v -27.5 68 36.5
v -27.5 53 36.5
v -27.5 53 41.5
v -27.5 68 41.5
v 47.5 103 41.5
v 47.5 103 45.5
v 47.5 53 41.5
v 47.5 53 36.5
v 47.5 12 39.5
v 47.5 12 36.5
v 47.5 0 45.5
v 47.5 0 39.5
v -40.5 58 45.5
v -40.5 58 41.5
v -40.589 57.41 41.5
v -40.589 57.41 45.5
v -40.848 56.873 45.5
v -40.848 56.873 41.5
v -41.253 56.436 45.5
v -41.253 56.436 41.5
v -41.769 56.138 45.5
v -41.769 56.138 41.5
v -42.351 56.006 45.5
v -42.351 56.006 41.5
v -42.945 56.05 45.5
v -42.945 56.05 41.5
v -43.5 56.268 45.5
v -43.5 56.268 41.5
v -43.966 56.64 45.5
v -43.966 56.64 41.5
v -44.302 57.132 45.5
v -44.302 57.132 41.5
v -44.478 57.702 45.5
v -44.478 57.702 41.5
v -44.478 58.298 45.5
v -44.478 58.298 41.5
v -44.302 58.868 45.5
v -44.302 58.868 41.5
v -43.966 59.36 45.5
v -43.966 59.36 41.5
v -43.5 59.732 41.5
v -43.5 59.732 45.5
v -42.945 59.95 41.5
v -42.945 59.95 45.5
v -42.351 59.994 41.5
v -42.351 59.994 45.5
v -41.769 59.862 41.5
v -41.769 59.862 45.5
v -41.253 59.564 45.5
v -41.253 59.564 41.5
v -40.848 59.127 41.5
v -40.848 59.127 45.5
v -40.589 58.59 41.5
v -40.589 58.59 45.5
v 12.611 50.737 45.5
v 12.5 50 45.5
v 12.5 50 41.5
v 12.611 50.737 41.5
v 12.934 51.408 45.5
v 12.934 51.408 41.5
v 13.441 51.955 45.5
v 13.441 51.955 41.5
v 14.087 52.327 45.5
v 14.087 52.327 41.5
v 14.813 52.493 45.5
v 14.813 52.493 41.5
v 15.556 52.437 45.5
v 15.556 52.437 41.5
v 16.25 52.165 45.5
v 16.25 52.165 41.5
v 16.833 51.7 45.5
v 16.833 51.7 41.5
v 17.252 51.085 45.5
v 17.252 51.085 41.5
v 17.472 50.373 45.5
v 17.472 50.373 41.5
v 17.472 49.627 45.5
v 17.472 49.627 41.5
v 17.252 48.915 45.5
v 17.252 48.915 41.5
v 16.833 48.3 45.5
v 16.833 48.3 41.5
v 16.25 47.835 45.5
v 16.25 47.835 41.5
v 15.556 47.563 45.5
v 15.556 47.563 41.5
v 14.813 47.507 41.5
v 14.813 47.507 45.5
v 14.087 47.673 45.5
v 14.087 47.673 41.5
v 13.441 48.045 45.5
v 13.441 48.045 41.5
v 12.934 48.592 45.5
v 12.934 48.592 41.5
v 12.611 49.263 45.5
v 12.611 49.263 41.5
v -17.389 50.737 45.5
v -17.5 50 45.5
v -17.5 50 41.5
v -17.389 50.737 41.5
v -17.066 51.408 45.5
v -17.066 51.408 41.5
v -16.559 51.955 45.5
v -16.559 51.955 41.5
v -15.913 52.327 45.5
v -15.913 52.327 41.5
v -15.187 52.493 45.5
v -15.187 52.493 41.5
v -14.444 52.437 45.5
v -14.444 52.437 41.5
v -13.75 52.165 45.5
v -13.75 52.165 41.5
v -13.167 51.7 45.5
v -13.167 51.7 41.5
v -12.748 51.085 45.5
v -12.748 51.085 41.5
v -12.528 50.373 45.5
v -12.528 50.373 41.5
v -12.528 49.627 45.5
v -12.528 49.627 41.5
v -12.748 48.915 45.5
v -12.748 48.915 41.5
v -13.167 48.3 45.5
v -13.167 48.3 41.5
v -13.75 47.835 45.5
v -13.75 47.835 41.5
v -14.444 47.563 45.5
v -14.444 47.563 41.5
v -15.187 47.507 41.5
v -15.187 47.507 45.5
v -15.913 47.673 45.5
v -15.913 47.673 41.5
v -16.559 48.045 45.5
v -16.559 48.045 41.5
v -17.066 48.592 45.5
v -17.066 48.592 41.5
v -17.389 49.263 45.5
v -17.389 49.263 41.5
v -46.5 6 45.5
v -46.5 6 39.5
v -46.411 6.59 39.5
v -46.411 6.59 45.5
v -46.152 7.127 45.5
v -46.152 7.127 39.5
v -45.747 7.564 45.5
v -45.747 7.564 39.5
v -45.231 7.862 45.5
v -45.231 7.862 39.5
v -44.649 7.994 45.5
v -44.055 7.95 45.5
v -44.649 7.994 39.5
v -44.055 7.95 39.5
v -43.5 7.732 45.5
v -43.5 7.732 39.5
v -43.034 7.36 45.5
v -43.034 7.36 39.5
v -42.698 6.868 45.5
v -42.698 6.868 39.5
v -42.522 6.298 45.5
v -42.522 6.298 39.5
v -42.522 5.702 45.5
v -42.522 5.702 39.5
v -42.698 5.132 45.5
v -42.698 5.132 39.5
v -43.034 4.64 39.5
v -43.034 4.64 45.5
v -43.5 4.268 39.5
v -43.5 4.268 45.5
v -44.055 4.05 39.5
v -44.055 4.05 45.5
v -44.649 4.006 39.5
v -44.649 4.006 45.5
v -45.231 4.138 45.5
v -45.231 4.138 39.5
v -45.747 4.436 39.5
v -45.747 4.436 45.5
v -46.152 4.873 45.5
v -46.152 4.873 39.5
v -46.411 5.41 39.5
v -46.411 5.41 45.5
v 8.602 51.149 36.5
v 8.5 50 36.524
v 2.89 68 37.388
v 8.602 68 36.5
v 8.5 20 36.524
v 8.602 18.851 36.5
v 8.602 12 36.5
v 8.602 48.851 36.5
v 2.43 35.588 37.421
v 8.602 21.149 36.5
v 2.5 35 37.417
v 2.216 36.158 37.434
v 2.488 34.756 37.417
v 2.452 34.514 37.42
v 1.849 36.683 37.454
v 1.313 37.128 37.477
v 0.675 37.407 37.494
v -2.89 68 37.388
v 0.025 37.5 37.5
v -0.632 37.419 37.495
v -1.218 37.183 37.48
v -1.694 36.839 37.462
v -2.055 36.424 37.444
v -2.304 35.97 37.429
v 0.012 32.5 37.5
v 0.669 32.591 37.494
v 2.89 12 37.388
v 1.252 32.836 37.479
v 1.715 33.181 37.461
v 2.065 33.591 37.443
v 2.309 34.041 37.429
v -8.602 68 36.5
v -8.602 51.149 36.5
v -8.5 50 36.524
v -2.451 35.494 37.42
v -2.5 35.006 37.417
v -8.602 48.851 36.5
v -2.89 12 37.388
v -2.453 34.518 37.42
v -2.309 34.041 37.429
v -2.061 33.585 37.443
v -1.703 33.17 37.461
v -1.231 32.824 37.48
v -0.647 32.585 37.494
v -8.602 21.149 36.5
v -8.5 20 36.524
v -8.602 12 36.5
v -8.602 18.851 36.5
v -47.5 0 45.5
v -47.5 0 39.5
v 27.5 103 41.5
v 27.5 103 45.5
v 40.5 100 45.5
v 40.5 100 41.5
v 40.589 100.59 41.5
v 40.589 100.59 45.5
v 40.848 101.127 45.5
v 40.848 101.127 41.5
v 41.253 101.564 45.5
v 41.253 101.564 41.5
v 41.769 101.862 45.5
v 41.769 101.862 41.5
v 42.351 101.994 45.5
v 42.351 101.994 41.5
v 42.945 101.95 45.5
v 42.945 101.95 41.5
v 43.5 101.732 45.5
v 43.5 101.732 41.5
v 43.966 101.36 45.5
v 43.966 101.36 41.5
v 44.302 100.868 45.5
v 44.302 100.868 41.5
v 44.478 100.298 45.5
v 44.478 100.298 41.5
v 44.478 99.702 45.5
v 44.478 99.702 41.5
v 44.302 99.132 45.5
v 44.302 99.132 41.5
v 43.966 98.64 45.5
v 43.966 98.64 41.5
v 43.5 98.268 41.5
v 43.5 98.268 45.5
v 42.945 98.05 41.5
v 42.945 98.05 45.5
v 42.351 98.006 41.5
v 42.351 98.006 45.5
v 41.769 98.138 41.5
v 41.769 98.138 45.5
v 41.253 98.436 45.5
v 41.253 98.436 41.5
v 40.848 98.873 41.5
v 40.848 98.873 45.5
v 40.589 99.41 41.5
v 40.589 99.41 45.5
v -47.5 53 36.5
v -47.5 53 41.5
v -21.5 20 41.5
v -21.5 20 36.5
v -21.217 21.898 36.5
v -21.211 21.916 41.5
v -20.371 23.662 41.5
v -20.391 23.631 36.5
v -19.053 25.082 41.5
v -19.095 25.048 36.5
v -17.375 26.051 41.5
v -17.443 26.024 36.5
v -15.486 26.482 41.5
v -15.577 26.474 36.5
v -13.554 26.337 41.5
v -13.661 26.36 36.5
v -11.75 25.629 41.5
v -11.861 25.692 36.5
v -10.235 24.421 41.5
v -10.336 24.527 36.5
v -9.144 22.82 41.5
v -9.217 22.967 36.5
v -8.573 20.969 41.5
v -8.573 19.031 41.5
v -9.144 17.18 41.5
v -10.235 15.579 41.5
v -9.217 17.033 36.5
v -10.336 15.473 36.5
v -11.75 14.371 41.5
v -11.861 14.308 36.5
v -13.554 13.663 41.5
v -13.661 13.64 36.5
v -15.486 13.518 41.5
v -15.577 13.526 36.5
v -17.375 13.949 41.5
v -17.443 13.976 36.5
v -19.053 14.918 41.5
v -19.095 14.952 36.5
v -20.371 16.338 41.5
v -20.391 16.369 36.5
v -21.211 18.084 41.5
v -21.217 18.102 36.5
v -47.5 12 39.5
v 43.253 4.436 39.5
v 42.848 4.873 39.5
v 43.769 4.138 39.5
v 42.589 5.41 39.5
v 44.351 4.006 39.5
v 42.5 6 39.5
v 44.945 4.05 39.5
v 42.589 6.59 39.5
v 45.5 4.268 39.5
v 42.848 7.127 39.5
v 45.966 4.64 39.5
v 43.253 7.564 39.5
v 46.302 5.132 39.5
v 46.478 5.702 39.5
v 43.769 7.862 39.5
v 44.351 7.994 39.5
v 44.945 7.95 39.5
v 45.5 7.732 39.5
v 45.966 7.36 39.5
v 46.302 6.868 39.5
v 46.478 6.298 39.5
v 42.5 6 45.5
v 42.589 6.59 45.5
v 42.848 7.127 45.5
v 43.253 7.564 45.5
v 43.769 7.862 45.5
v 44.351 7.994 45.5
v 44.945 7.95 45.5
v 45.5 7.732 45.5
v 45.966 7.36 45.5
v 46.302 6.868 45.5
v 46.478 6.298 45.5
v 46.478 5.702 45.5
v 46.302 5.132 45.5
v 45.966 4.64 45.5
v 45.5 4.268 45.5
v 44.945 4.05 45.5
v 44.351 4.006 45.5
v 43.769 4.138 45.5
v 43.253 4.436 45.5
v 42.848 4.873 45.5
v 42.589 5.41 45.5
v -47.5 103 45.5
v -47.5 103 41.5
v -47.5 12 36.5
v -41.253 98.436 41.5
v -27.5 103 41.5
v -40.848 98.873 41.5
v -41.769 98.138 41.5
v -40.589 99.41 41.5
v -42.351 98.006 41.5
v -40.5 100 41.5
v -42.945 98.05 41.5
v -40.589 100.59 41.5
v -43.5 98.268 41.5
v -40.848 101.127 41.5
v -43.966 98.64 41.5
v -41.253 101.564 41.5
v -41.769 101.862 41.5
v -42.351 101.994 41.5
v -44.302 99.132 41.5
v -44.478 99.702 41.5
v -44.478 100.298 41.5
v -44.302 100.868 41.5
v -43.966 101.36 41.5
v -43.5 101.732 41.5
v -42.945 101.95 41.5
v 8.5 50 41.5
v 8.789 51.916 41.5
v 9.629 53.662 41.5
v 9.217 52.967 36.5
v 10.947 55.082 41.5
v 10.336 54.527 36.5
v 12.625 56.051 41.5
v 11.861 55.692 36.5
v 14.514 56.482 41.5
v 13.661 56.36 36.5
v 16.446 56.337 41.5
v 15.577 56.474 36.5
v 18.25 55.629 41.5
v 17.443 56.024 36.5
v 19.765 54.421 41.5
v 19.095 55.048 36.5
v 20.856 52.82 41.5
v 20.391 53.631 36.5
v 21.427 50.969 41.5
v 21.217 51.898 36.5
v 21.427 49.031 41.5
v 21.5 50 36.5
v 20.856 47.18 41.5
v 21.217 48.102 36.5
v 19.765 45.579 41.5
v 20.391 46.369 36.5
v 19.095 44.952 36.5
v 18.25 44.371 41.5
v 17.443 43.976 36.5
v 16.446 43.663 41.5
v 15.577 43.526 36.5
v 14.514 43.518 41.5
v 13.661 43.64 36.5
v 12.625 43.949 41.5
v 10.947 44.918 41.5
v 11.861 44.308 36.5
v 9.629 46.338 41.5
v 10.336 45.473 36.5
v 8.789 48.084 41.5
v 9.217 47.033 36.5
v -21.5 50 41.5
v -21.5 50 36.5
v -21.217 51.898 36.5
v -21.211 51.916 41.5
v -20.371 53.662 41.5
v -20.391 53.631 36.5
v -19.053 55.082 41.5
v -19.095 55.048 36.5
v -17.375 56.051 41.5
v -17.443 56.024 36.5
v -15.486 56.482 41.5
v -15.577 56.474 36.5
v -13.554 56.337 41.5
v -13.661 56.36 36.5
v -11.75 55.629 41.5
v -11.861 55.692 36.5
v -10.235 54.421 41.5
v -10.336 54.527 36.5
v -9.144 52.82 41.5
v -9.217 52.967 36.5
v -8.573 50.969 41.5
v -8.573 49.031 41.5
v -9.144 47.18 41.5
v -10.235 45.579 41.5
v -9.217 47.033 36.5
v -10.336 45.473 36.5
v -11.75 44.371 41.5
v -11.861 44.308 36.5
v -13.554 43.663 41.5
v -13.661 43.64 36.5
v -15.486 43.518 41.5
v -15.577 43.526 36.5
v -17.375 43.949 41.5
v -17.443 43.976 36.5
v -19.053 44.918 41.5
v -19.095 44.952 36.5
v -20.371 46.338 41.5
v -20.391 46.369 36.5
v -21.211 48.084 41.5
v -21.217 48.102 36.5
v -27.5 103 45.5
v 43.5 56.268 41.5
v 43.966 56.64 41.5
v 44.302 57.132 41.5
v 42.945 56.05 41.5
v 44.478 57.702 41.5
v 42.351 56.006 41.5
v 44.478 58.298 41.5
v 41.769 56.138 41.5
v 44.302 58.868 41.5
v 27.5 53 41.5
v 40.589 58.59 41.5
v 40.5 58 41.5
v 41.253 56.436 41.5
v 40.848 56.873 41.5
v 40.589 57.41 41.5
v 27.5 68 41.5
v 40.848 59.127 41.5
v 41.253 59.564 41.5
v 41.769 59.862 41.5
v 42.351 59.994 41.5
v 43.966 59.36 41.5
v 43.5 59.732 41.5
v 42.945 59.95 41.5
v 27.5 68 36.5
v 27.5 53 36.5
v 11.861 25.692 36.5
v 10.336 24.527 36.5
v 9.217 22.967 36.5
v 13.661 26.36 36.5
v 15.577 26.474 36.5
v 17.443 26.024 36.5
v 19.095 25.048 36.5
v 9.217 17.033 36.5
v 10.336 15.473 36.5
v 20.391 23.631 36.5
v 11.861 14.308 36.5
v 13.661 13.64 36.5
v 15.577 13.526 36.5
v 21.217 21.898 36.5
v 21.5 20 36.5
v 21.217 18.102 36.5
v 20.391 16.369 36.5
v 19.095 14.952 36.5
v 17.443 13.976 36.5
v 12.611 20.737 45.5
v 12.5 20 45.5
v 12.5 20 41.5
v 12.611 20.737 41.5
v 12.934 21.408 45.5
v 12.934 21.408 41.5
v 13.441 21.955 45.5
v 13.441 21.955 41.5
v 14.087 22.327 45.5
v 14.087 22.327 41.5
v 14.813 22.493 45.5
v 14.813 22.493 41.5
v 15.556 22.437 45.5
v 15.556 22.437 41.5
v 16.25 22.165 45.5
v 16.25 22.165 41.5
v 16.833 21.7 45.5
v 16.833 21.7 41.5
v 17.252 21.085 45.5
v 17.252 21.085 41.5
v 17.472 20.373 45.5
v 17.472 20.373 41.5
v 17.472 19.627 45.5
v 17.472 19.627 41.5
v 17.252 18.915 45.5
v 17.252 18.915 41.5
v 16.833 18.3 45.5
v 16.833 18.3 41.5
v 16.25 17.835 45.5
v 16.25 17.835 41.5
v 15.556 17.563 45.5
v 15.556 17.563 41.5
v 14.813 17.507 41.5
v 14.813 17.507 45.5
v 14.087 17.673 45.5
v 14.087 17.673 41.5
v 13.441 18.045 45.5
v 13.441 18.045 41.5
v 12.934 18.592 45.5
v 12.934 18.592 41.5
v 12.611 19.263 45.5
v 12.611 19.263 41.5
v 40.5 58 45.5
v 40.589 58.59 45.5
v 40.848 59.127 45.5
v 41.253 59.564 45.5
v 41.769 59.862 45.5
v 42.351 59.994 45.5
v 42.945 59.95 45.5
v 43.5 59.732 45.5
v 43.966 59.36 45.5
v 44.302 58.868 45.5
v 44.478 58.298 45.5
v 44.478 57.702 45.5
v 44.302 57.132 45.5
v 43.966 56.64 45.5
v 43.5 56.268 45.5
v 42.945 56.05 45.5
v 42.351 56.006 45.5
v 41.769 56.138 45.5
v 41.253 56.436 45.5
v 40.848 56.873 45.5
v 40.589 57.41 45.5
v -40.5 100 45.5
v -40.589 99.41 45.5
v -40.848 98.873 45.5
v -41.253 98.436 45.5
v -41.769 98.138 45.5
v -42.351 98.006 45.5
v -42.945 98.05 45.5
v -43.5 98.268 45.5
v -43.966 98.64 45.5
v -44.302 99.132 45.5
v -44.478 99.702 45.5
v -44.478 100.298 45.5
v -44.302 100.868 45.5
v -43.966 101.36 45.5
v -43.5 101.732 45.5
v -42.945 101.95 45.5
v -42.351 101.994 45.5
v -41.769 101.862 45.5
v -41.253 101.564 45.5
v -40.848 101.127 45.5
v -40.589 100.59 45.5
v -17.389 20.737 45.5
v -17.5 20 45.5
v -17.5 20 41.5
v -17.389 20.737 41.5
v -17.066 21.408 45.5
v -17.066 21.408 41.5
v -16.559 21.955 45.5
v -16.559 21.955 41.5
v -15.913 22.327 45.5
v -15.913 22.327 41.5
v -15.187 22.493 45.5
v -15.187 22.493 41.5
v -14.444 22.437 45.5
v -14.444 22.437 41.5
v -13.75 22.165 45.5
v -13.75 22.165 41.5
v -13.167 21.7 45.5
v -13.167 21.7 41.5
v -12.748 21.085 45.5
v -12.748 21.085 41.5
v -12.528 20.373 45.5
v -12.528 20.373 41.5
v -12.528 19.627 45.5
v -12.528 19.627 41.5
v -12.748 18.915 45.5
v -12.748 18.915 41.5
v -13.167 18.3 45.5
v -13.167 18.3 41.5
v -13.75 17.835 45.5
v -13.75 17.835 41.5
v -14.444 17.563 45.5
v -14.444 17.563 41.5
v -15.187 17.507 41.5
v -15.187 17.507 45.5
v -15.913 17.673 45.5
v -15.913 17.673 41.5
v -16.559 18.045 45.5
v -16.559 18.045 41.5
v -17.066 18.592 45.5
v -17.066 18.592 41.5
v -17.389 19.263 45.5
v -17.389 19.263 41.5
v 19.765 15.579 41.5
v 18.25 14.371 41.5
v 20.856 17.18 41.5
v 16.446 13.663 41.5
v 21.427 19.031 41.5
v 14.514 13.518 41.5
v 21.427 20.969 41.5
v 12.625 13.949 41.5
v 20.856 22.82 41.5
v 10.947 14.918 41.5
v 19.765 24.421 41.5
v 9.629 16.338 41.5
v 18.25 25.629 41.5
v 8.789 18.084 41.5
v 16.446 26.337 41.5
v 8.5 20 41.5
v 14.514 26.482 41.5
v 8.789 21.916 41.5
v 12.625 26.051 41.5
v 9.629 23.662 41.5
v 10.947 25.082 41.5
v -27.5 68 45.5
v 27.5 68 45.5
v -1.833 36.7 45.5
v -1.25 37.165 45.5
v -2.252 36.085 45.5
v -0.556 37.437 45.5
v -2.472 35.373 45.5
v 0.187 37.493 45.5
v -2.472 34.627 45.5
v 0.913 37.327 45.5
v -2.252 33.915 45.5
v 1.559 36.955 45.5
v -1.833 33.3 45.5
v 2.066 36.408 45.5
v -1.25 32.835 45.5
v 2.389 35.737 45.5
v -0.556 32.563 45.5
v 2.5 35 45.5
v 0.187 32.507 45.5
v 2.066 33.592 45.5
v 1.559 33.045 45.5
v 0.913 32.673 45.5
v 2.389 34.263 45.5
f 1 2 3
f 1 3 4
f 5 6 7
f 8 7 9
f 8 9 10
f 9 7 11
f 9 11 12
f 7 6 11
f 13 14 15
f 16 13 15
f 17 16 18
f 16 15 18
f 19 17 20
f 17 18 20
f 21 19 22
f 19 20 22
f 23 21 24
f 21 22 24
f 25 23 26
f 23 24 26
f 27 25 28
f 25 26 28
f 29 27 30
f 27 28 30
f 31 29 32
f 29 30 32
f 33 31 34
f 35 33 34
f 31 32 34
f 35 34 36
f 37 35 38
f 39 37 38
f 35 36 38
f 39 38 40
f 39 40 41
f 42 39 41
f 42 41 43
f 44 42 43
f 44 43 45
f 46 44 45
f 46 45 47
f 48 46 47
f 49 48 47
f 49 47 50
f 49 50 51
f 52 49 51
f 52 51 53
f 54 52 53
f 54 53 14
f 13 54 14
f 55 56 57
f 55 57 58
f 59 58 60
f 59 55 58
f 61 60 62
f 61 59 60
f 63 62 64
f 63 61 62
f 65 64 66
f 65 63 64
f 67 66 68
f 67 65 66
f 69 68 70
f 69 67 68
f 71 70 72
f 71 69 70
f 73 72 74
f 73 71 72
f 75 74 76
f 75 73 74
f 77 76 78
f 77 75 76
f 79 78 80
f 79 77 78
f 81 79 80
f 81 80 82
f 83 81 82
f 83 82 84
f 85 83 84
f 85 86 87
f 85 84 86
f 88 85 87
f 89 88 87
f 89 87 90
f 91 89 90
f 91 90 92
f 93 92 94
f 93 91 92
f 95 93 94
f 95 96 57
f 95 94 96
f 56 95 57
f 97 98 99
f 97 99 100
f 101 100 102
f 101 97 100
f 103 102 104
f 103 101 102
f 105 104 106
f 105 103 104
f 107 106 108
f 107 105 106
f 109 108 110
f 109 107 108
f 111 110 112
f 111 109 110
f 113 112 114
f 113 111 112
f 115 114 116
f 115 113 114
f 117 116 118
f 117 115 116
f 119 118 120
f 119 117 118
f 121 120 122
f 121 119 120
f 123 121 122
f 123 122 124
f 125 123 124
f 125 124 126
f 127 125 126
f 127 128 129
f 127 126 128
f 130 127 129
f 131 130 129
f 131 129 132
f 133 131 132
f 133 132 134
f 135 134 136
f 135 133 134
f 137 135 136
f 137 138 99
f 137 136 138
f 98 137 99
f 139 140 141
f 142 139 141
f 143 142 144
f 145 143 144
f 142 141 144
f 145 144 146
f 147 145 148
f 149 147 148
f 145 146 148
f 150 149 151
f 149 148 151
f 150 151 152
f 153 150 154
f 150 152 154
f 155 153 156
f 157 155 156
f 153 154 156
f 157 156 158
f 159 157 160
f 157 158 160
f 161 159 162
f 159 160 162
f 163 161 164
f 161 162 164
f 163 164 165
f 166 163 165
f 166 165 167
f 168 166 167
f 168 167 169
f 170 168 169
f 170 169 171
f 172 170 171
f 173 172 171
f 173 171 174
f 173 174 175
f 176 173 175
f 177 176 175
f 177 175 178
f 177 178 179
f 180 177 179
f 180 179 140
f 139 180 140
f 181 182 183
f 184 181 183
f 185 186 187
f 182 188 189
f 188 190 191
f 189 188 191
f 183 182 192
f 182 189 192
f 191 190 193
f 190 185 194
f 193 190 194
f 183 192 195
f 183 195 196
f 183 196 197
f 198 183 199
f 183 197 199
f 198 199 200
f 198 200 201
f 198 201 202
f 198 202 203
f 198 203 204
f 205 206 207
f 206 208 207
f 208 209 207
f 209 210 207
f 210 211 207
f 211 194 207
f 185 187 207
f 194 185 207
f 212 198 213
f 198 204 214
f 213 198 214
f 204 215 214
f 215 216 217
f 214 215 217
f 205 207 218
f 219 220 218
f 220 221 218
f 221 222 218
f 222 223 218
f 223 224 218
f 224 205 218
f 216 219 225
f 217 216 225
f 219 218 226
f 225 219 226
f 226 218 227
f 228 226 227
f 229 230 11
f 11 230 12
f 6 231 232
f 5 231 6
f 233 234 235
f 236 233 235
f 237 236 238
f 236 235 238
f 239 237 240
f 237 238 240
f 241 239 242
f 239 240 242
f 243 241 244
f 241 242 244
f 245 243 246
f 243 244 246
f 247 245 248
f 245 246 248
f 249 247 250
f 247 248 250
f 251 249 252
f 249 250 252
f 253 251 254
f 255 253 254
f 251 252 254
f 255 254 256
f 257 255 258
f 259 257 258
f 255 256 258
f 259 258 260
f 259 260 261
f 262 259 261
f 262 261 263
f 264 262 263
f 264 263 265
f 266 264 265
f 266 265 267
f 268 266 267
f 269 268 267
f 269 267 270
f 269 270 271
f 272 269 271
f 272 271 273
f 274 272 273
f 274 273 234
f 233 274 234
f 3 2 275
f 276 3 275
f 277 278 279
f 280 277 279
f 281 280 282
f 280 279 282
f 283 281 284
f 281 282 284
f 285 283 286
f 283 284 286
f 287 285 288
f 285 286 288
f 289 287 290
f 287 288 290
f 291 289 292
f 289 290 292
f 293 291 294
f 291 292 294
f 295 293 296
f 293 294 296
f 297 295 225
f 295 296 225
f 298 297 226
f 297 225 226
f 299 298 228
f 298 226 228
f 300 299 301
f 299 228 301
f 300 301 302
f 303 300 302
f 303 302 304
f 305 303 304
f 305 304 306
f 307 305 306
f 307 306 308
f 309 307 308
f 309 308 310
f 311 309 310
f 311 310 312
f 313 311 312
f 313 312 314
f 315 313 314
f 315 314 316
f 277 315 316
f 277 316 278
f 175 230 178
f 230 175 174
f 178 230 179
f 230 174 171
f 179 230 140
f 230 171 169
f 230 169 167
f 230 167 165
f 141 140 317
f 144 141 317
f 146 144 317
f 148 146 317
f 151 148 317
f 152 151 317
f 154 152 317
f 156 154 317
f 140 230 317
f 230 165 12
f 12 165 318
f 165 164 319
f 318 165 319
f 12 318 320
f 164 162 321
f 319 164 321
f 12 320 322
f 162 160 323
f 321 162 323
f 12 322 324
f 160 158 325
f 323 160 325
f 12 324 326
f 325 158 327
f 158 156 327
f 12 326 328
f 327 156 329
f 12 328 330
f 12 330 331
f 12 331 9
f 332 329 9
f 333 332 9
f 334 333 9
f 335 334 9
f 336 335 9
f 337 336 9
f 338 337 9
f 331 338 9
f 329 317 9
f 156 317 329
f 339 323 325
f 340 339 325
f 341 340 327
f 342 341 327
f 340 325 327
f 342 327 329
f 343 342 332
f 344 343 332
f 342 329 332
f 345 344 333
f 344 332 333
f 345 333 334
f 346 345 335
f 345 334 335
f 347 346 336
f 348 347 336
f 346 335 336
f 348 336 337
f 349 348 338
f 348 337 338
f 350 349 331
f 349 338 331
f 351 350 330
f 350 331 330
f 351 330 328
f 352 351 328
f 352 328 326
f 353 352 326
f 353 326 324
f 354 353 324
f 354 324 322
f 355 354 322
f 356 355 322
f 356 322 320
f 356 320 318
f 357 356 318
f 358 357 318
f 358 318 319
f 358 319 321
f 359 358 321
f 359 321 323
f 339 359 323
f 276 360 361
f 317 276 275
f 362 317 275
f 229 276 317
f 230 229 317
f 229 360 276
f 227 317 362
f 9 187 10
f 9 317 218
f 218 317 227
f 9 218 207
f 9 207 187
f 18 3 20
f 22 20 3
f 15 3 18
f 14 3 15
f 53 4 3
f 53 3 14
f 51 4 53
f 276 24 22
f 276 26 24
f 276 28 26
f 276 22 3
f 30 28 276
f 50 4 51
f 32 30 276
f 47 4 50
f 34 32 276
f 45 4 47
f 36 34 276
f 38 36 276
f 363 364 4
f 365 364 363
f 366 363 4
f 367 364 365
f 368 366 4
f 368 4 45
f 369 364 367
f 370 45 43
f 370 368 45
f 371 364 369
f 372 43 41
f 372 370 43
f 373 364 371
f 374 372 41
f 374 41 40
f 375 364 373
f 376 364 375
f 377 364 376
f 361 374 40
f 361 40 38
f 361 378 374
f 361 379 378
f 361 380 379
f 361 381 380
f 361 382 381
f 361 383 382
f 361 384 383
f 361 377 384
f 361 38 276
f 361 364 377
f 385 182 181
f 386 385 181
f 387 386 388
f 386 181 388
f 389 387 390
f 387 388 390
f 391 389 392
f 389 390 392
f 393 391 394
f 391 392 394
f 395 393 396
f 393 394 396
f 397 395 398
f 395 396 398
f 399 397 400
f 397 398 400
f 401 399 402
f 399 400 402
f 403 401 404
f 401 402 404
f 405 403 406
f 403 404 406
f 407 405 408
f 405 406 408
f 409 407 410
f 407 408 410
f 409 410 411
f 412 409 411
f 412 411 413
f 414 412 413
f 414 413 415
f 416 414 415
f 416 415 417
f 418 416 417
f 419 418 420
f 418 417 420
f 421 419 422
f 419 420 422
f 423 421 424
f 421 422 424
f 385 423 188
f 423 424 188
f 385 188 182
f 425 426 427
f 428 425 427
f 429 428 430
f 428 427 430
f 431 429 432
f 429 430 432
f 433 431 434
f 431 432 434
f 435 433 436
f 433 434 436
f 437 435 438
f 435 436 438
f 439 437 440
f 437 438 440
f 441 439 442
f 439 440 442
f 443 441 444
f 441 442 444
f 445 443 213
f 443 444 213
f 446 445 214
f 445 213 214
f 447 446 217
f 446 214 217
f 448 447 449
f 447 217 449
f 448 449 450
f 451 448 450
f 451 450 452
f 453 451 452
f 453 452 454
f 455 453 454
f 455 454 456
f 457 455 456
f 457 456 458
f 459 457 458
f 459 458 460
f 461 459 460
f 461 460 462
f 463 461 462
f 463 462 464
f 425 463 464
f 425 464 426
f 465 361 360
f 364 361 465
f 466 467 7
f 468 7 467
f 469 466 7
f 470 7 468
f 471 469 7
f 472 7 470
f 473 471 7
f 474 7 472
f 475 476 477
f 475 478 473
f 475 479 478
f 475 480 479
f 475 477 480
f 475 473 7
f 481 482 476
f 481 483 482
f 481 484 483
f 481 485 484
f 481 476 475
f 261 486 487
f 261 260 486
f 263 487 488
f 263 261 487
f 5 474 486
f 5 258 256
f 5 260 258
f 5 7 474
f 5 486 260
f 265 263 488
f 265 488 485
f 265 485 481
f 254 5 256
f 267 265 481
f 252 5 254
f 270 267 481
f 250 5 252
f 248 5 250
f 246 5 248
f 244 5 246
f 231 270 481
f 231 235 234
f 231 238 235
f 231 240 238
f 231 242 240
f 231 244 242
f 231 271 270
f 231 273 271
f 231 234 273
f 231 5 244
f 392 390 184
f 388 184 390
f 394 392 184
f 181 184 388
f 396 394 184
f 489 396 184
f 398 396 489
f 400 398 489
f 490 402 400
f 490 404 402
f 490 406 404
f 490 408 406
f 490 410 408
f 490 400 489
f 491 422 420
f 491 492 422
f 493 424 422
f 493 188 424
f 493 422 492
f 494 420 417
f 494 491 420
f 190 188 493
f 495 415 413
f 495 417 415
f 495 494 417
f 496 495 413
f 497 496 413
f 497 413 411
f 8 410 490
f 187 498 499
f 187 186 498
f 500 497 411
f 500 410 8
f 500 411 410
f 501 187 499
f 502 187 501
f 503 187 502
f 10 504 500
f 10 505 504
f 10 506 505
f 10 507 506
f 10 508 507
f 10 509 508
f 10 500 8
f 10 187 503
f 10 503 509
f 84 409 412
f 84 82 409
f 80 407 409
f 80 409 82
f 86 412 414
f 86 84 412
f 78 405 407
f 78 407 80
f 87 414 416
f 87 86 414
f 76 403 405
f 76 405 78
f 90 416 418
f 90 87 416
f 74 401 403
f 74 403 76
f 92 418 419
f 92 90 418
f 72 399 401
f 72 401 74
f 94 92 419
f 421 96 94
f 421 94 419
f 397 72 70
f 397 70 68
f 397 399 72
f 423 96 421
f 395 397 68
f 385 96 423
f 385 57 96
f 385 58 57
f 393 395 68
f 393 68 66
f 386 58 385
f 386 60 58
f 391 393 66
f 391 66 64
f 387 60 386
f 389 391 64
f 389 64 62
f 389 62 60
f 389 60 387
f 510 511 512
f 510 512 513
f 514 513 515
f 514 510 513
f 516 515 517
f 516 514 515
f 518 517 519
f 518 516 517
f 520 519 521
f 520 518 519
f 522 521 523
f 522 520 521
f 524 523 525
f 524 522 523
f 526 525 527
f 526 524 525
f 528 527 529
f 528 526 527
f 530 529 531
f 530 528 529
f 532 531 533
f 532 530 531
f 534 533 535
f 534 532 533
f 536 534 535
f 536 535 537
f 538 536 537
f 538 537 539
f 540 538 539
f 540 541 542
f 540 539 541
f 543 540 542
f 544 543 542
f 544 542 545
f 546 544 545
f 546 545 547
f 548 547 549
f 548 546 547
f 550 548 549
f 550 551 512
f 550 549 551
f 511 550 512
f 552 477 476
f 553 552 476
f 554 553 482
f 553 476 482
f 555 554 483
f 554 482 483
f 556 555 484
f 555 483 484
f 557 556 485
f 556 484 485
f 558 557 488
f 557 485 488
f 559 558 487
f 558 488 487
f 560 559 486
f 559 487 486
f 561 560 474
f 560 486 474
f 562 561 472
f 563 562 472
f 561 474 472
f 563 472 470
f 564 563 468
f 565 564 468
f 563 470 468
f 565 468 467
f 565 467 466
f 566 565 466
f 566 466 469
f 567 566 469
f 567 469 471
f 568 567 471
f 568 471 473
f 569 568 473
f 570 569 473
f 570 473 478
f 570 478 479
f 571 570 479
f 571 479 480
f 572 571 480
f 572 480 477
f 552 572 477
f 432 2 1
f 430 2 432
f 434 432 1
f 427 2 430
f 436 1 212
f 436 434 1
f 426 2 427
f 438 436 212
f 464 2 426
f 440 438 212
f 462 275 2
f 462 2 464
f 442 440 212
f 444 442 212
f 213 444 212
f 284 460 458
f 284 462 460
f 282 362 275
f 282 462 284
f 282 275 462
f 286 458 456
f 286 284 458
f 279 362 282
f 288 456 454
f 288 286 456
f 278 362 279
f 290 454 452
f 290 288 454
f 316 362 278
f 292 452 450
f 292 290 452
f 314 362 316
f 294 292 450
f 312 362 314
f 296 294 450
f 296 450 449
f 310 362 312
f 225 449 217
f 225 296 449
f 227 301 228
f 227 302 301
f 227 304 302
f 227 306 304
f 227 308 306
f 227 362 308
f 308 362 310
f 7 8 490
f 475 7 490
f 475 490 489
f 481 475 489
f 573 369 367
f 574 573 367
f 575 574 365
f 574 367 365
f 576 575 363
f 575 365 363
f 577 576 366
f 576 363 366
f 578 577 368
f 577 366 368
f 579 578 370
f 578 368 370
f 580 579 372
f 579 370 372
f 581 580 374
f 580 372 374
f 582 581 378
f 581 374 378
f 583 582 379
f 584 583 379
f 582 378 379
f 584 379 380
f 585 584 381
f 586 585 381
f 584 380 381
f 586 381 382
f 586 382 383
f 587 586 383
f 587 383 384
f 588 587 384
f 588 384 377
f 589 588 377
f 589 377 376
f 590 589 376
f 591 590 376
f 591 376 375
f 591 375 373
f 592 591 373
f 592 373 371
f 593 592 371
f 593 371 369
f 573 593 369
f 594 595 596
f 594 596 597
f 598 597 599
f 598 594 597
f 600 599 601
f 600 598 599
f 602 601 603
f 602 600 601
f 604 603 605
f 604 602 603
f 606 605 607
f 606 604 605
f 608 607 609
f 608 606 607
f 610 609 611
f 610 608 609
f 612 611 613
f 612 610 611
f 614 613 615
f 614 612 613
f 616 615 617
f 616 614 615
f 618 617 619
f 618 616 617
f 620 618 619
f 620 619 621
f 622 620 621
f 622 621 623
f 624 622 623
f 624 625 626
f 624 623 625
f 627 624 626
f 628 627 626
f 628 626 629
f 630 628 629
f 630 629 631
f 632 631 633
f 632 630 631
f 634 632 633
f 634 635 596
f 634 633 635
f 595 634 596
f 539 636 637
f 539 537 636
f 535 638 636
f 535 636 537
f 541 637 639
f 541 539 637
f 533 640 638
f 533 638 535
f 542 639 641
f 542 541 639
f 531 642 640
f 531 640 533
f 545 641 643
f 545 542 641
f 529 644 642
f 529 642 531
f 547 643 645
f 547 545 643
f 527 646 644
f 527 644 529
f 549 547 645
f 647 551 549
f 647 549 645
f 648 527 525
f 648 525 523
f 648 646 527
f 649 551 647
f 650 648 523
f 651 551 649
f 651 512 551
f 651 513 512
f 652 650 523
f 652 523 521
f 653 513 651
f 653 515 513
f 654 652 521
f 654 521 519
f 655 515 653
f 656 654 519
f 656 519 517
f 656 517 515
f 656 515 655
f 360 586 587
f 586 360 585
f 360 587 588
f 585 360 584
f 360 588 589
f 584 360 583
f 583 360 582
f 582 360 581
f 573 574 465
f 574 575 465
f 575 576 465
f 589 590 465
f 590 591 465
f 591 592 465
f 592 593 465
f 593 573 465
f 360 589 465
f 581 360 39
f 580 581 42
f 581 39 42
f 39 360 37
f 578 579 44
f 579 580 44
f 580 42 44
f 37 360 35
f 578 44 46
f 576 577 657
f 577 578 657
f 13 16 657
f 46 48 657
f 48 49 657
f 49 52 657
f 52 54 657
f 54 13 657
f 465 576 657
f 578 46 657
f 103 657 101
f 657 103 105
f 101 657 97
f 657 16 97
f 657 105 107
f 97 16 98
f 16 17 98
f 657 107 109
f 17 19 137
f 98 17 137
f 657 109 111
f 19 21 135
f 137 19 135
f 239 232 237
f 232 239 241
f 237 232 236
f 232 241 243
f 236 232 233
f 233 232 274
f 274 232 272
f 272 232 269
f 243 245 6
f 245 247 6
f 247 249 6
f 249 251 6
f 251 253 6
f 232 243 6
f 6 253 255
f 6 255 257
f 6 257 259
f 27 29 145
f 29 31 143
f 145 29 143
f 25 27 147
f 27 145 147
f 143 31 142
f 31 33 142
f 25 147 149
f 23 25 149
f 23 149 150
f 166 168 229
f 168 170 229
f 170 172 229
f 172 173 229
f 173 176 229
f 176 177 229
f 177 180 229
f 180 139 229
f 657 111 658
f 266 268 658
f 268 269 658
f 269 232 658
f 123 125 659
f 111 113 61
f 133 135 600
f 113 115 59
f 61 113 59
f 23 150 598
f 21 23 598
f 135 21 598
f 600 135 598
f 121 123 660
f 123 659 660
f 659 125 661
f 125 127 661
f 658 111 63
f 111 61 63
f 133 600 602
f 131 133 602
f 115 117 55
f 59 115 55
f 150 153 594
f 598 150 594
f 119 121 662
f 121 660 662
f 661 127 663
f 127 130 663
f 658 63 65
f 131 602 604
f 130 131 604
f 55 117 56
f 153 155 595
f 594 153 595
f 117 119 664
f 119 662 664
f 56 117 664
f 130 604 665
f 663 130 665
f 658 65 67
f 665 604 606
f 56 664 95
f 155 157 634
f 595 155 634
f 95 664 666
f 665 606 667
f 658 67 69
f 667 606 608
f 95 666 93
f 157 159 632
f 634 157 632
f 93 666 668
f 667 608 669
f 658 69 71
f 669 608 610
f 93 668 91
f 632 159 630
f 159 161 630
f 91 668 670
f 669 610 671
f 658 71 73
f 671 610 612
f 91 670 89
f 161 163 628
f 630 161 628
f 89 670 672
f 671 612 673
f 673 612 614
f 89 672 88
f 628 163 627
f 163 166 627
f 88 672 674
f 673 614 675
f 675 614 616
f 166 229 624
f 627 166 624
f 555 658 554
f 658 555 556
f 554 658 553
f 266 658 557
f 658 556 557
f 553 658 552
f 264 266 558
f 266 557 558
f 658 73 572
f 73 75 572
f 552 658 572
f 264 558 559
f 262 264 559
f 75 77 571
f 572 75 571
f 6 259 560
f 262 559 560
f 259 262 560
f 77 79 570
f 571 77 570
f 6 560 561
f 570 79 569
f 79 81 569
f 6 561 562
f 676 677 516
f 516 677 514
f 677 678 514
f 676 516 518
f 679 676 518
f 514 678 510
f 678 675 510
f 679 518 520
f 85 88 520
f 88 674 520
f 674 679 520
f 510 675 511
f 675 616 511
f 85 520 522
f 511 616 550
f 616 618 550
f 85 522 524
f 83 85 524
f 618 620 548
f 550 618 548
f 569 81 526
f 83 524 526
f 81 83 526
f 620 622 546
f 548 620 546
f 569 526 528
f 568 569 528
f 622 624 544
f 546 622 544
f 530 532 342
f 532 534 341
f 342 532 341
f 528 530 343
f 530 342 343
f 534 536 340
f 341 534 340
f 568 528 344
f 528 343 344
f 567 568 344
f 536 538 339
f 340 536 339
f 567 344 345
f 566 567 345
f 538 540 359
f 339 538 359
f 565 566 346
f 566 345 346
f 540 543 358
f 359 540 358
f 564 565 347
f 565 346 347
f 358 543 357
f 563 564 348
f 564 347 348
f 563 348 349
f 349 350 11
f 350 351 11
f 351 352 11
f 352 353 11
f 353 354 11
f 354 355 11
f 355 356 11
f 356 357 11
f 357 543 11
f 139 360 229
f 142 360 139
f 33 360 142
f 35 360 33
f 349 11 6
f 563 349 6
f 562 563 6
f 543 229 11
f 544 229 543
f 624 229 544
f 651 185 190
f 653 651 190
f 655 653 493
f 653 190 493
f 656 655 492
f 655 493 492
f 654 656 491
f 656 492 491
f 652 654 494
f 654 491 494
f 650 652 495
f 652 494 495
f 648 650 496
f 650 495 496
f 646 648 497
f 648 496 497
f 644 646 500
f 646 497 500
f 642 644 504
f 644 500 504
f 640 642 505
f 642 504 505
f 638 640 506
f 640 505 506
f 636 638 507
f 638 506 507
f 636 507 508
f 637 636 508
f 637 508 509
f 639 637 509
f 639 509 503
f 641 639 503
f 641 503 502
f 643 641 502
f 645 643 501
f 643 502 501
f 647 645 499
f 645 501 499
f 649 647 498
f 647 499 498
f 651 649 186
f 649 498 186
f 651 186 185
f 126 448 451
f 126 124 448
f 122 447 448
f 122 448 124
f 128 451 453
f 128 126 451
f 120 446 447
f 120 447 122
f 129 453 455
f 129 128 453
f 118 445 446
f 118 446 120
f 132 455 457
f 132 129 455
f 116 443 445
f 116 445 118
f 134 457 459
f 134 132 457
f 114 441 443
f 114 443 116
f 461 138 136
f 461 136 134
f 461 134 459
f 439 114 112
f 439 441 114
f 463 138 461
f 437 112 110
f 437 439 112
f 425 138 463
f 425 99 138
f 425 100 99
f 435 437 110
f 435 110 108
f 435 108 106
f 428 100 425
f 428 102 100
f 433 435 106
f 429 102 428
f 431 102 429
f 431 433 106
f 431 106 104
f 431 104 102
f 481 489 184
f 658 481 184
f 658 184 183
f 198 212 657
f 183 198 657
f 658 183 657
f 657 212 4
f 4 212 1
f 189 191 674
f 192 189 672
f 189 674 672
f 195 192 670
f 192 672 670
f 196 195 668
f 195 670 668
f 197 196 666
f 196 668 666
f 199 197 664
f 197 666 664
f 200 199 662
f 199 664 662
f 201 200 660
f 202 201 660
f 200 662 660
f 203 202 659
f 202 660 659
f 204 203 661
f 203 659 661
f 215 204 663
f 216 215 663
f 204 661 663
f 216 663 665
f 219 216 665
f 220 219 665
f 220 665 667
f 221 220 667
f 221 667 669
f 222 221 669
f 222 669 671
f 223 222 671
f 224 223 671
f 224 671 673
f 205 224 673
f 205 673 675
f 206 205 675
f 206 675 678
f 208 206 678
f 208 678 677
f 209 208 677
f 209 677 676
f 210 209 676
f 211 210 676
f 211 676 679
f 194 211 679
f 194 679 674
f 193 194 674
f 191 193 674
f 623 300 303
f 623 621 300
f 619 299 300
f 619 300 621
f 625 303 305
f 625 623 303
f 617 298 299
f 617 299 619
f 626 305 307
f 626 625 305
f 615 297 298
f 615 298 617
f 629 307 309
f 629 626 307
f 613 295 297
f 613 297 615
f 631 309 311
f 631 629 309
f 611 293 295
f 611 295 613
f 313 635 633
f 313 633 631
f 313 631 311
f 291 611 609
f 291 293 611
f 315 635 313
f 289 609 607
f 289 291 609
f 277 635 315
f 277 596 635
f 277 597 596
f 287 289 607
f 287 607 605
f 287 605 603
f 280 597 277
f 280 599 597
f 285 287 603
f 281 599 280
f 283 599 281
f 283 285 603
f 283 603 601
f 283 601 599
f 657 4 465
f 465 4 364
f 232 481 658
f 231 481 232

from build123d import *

# Parameters (mm, degrees)
SKETCH1_R                = 37.5
BOSS_EXTRUDE1_DEPTH      = 12
SKETCH2_R                = 30
BOSS_EXTRUDE2_DEPTH      = 56
BOSS_EXTRUDE3_DEPTH      = 5
BOSS_EXTRUDE3_DEPTH_BACK = 1
SKETCH4_W                = 75
SKETCH4_H                = 15
SKETCH4_R                = 3.5
MOVE_FACE3_BY            = 10
MOVE_FACE3_2_BY          = 10
BOSS_EXTRUDE4_DEPTH      = 12
BOSS_EXTRUDE5_DEPTH      = 68
MOVE_START               = 42.5
MOVE_FACE1_OUTLINE_W     = 95
MOVE_FACE1_OUTLINE_H     = 83
MOVE_FACE1_OUTLINE_R     = 3.5
MOVE_FACE1_DEPTH         = 10
SKETCH11_W               = 95
SKETCH11_H               = 15
BOSS_EXTRUDE7_DEPTH      = 20
CUT_EXTRUDE1_DEPTH       = 103.720494547
CUT_EXTRUDE1_DEPTH_BACK  = 103.720494547
SKETCH12_R               = 2.5
SKETCH13_R               = 6.5
CUT_EXTRUDE2_DEPTH       = 5
MOVE_FACE2_BY            = 7
DELETEFACE1_START        = -20
DELETEFACE1_OUTLINE_W    = 95
DELETEFACE1_OUTLINE_H    = 8
DELETEFACE1_DEPTH        = 20
CUT_EXTRUDE3_DEPTH       = 103.359660059
CUT_EXTRUDE3_DEPTH_BACK  = 3
SKETCH15_R               = 2
CUT_EXTRUDE4_DEPTH       = 96.818839484
MOVE_FACE4_BY            = 20
SKETCH16_W               = 55
SKETCH16_H               = 35
CUT_EXTRUDE5_DEPTH       = 10
SKETCH17_W               = 20
SKETCH17_H               = 50
CUT_EXTRUDE6_DEPTH       = 5
SKETCH18_R               = 2
CUT_EXTRUDE7_DEPTH       = 114.535236825
SKETCH19_R               = 2.5
CUT_EXTRUDE8_DEPTH       = 114.781589028


# Read off the part's stored shape, not the designer's step: Move Face1, DeleteFace1
with BuildPart() as part:
    # Sketch1 → Boss-Extrude1 (new body)
    with BuildSketch(Plane(origin=(0, 0, 0), x_dir=(1, 0, 0), z_dir=(0, 1, 0))):
        with Locations(Location((0, 0, 0), (0, 0, 270))):
            Circle(SKETCH1_R)
    extrude(amount=BOSS_EXTRUDE1_DEPTH)

    # Sketch2 → Boss-Extrude2 (add)
    with BuildSketch(Plane(origin=(0, 12, 0), x_dir=(1, 0, 0), z_dir=(0, 1, 0))):
        with Locations(Location((0, 0, 0), (0, 0, 270))):
            Circle(SKETCH2_R)
    extrude(amount=BOSS_EXTRUDE2_DEPTH)


with BuildPart() as body_2:
    # Sketch4 → Boss-Extrude3 (new, two sides: drawn at the far end of the back side and taken through both)
    with BuildSketch(Plane.XY.offset(37.5).offset(-BOSS_EXTRUDE3_DEPTH_BACK)):
        with Locations((0, 75.5)):
            Rectangle(SKETCH4_W, SKETCH4_H)
        with Locations((0, 76)):
            Circle(SKETCH4_R, mode=Mode.SUBTRACT)
    extrude(amount=BOSS_EXTRUDE3_DEPTH + BOSS_EXTRUDE3_DEPTH_BACK)

    # Move Face3: a face moved outward by 10.0
    extrude(body_2.faces().sort_by_distance((-37.5, 75.5, 39.5))[0], amount=MOVE_FACE3_BY, dir=(-1, 0, 0))

    # Move Face3 2: a face moved outward by 10.0
    extrude(body_2.faces().sort_by_distance((37.5, 75.5, 39.5))[0], amount=MOVE_FACE3_2_BY, dir=(1, 0, 0))



with BuildPart() as body_3:
    # Sketch6 → Boss-Extrude4 (new body)
    with BuildSketch(Plane.XZ):
        with BuildLine():
            Line((42.5, 0), (37.5, 0))
            ThreePointArc((37.5, 0), (0, 37.5), (-37.5, 0))
            Line((-37.5, 0), (-42.5, 0))
            ThreePointArc((-42.5, 0), (0, 42.5), (42.5, 0))
        make_face()
    extrude(amount=-BOSS_EXTRUDE4_DEPTH)


with BuildPart() as body_2_1:
    add(body_2.part)

    add(body_3.part)  # Boss-Extrude5 merges body 3
    # Sketch7 → Boss-Extrude5 (add)
    with BuildSketch(Plane.XZ.offset(-68)):
        with BuildLine():
            Line((8.602325267, 36.5), (47.5, 36.5))
            Line((47.5, 36.5), (47.5, 42.5))
            Line((47.5, 42.5), (-47.5, 42.5))
            Line((-47.5, 42.5), (-47.5, 36.5))
            Line((-47.5, 36.5), (-8.602325267, 36.5))
            ThreePointArc((-8.602325267, 36.5), (0, 37.5), (8.602325267, 36.5))
        make_face()
    extrude(amount=BOSS_EXTRUDE5_DEPTH)

    # Move Face1 outline → Move Face1 (add)
    with BuildSketch(Plane.XY.offset(MOVE_START)):
        with Locations((0, 41.5)):
            Rectangle(MOVE_FACE1_OUTLINE_W, MOVE_FACE1_OUTLINE_H)
        with Locations((0, 76)):
            Circle(MOVE_FACE1_OUTLINE_R, mode=Mode.SUBTRACT)
    extrude(amount=MOVE_FACE1_DEPTH)

    # Sketch11 → Boss-Extrude7 (add)
    with BuildSketch(Plane.XZ):
        with Locations((0, 45)):
            Rectangle(SKETCH11_W, SKETCH11_H)
    extrude(amount=BOSS_EXTRUDE7_DEPTH)

    # Sketch12 → Cut-Extrude1 (cut, two sides: drawn at the far end of the back side and taken through both)
    with BuildSketch(Plane(origin=(0, 0, 37.5), x_dir=(-1, 0, 0), z_dir=(0, 0, -1)).offset(-CUT_EXTRUDE1_DEPTH_BACK)):
        with Locations((-15, 20)):
            Circle(SKETCH12_R)
        with Locations((15, 20)):
            Circle(SKETCH12_R)
        with Locations((-15, 50)):
            Circle(SKETCH12_R)
        with Locations((15, 50)):
            Circle(SKETCH12_R)
    extrude(amount=CUT_EXTRUDE1_DEPTH + CUT_EXTRUDE1_DEPTH_BACK, mode=Mode.SUBTRACT)

    # Sketch13 → Cut-Extrude2 (cut)
    with BuildSketch(Plane(origin=(0, 0, 36.5), x_dir=(-1, 0, 0), z_dir=(0, 0, -1))):
        with Locations((-15, 50)):
            Circle(SKETCH13_R)
        with Locations((15, 50)):
            Circle(SKETCH13_R)
        with Locations((-15, 20)):
            Circle(SKETCH13_R)
        with Locations((15, 20)):
            Circle(SKETCH13_R)
    extrude(amount=-CUT_EXTRUDE2_DEPTH, mode=Mode.SUBTRACT)

    # Move Face2: a face moved inward by 7.0
    extrude(body_2_1.faces().sort_by_distance((0, 31.294429556, 52.5))[0], amount=MOVE_FACE2_BY, dir=(0, 0, -1), mode=Mode.SUBTRACT)

    # DeleteFace1 outline → DeleteFace1 (cut)
    with BuildSketch(Plane(origin=(0, 0, 0), x_dir=(1, 0, 0), z_dir=(0, 1, 0)).offset(DELETEFACE1_START)):
        with Locations((0, -41.5)):
            Rectangle(DELETEFACE1_OUTLINE_W, DELETEFACE1_OUTLINE_H)
    extrude(amount=DELETEFACE1_DEPTH, mode=Mode.SUBTRACT)

    # Sketch14 → Cut-Extrude3 (cut, two sides: drawn at the far end of the back side and taken through both)
    with BuildSketch(Plane(origin=(0, 0, 36.5), x_dir=(-1, 0, 0), z_dir=(0, 0, -1)).offset(-CUT_EXTRUDE3_DEPTH_BACK)):
        Polygon((47.5, 0), (-42.5, 0), (-47.5, 0), (-47.5, 12), (-42.5, 12), (47.5, 12), align=None)
    extrude(amount=CUT_EXTRUDE3_DEPTH + CUT_EXTRUDE3_DEPTH_BACK, mode=Mode.SUBTRACT)

    # Sketch15 → Cut-Extrude4 (cut, through all)
    with BuildSketch(Plane(origin=(0, 0, 39.5), x_dir=(-1, 0, 0), z_dir=(0, 0, -1))):
        with Locations((44.5, 6)):
            Circle(SKETCH15_R)
        with Locations((-44.5, 6)):
            Circle(SKETCH15_R)
    extrude(amount=-CUT_EXTRUDE4_DEPTH, mode=Mode.SUBTRACT)

    # Move Face4: a face moved outward by 20.0
    extrude(body_2_1.faces().sort_by_distance((0, 83, 41))[0], amount=MOVE_FACE4_BY, dir=(0, 1, 0))

    # Sketch16 → Cut-Extrude5 (cut)
    with BuildSketch(Plane(origin=(0, 0, 36.5), x_dir=(-1, 0, 0), z_dir=(0, 0, -1))):
        with Locations((0, 85.5)):
            Rectangle(SKETCH16_W, SKETCH16_H)
    extrude(amount=-CUT_EXTRUDE5_DEPTH, mode=Mode.SUBTRACT)

    # Sketch17 → Cut-Extrude6 (cut)
    with BuildSketch(Plane(origin=(0, 0, 36.5), x_dir=(-1, 0, 0), z_dir=(0, 0, -1))):
        with Locations((37.5, 78)):
            Rectangle(SKETCH17_W, SKETCH17_H)
        with Locations((-37.5, 78)):
            Rectangle(SKETCH17_W, SKETCH17_H)
    extrude(amount=-CUT_EXTRUDE6_DEPTH, mode=Mode.SUBTRACT)

    # Sketch18 → Cut-Extrude7 (cut, through all)
    with BuildSketch(Plane(origin=(0, 0, 41.5), x_dir=(-1, 0, 0), z_dir=(0, 0, -1))):
        with Locations((-42.5, 58)):
            Circle(SKETCH18_R)
        with Locations((-42.5, 100)):
            Circle(SKETCH18_R)
        with Locations(Location((42.5, 100, 0), (0, 0, 180))):
            Circle(SKETCH18_R)
        with Locations(Location((42.5, 58, 0), (0, 0, 180))):
            Circle(SKETCH18_R)
    extrude(amount=-CUT_EXTRUDE7_DEPTH, mode=Mode.SUBTRACT)

    # Sketch19 → Cut-Extrude8 (cut, through all)
    with BuildSketch(Plane.XY.offset(45.5)):
        with Locations((0, 35)):
            Circle(SKETCH19_R)
    extrude(amount=-CUT_EXTRUDE8_DEPTH, mode=Mode.SUBTRACT)


solid = body_2_1.part
